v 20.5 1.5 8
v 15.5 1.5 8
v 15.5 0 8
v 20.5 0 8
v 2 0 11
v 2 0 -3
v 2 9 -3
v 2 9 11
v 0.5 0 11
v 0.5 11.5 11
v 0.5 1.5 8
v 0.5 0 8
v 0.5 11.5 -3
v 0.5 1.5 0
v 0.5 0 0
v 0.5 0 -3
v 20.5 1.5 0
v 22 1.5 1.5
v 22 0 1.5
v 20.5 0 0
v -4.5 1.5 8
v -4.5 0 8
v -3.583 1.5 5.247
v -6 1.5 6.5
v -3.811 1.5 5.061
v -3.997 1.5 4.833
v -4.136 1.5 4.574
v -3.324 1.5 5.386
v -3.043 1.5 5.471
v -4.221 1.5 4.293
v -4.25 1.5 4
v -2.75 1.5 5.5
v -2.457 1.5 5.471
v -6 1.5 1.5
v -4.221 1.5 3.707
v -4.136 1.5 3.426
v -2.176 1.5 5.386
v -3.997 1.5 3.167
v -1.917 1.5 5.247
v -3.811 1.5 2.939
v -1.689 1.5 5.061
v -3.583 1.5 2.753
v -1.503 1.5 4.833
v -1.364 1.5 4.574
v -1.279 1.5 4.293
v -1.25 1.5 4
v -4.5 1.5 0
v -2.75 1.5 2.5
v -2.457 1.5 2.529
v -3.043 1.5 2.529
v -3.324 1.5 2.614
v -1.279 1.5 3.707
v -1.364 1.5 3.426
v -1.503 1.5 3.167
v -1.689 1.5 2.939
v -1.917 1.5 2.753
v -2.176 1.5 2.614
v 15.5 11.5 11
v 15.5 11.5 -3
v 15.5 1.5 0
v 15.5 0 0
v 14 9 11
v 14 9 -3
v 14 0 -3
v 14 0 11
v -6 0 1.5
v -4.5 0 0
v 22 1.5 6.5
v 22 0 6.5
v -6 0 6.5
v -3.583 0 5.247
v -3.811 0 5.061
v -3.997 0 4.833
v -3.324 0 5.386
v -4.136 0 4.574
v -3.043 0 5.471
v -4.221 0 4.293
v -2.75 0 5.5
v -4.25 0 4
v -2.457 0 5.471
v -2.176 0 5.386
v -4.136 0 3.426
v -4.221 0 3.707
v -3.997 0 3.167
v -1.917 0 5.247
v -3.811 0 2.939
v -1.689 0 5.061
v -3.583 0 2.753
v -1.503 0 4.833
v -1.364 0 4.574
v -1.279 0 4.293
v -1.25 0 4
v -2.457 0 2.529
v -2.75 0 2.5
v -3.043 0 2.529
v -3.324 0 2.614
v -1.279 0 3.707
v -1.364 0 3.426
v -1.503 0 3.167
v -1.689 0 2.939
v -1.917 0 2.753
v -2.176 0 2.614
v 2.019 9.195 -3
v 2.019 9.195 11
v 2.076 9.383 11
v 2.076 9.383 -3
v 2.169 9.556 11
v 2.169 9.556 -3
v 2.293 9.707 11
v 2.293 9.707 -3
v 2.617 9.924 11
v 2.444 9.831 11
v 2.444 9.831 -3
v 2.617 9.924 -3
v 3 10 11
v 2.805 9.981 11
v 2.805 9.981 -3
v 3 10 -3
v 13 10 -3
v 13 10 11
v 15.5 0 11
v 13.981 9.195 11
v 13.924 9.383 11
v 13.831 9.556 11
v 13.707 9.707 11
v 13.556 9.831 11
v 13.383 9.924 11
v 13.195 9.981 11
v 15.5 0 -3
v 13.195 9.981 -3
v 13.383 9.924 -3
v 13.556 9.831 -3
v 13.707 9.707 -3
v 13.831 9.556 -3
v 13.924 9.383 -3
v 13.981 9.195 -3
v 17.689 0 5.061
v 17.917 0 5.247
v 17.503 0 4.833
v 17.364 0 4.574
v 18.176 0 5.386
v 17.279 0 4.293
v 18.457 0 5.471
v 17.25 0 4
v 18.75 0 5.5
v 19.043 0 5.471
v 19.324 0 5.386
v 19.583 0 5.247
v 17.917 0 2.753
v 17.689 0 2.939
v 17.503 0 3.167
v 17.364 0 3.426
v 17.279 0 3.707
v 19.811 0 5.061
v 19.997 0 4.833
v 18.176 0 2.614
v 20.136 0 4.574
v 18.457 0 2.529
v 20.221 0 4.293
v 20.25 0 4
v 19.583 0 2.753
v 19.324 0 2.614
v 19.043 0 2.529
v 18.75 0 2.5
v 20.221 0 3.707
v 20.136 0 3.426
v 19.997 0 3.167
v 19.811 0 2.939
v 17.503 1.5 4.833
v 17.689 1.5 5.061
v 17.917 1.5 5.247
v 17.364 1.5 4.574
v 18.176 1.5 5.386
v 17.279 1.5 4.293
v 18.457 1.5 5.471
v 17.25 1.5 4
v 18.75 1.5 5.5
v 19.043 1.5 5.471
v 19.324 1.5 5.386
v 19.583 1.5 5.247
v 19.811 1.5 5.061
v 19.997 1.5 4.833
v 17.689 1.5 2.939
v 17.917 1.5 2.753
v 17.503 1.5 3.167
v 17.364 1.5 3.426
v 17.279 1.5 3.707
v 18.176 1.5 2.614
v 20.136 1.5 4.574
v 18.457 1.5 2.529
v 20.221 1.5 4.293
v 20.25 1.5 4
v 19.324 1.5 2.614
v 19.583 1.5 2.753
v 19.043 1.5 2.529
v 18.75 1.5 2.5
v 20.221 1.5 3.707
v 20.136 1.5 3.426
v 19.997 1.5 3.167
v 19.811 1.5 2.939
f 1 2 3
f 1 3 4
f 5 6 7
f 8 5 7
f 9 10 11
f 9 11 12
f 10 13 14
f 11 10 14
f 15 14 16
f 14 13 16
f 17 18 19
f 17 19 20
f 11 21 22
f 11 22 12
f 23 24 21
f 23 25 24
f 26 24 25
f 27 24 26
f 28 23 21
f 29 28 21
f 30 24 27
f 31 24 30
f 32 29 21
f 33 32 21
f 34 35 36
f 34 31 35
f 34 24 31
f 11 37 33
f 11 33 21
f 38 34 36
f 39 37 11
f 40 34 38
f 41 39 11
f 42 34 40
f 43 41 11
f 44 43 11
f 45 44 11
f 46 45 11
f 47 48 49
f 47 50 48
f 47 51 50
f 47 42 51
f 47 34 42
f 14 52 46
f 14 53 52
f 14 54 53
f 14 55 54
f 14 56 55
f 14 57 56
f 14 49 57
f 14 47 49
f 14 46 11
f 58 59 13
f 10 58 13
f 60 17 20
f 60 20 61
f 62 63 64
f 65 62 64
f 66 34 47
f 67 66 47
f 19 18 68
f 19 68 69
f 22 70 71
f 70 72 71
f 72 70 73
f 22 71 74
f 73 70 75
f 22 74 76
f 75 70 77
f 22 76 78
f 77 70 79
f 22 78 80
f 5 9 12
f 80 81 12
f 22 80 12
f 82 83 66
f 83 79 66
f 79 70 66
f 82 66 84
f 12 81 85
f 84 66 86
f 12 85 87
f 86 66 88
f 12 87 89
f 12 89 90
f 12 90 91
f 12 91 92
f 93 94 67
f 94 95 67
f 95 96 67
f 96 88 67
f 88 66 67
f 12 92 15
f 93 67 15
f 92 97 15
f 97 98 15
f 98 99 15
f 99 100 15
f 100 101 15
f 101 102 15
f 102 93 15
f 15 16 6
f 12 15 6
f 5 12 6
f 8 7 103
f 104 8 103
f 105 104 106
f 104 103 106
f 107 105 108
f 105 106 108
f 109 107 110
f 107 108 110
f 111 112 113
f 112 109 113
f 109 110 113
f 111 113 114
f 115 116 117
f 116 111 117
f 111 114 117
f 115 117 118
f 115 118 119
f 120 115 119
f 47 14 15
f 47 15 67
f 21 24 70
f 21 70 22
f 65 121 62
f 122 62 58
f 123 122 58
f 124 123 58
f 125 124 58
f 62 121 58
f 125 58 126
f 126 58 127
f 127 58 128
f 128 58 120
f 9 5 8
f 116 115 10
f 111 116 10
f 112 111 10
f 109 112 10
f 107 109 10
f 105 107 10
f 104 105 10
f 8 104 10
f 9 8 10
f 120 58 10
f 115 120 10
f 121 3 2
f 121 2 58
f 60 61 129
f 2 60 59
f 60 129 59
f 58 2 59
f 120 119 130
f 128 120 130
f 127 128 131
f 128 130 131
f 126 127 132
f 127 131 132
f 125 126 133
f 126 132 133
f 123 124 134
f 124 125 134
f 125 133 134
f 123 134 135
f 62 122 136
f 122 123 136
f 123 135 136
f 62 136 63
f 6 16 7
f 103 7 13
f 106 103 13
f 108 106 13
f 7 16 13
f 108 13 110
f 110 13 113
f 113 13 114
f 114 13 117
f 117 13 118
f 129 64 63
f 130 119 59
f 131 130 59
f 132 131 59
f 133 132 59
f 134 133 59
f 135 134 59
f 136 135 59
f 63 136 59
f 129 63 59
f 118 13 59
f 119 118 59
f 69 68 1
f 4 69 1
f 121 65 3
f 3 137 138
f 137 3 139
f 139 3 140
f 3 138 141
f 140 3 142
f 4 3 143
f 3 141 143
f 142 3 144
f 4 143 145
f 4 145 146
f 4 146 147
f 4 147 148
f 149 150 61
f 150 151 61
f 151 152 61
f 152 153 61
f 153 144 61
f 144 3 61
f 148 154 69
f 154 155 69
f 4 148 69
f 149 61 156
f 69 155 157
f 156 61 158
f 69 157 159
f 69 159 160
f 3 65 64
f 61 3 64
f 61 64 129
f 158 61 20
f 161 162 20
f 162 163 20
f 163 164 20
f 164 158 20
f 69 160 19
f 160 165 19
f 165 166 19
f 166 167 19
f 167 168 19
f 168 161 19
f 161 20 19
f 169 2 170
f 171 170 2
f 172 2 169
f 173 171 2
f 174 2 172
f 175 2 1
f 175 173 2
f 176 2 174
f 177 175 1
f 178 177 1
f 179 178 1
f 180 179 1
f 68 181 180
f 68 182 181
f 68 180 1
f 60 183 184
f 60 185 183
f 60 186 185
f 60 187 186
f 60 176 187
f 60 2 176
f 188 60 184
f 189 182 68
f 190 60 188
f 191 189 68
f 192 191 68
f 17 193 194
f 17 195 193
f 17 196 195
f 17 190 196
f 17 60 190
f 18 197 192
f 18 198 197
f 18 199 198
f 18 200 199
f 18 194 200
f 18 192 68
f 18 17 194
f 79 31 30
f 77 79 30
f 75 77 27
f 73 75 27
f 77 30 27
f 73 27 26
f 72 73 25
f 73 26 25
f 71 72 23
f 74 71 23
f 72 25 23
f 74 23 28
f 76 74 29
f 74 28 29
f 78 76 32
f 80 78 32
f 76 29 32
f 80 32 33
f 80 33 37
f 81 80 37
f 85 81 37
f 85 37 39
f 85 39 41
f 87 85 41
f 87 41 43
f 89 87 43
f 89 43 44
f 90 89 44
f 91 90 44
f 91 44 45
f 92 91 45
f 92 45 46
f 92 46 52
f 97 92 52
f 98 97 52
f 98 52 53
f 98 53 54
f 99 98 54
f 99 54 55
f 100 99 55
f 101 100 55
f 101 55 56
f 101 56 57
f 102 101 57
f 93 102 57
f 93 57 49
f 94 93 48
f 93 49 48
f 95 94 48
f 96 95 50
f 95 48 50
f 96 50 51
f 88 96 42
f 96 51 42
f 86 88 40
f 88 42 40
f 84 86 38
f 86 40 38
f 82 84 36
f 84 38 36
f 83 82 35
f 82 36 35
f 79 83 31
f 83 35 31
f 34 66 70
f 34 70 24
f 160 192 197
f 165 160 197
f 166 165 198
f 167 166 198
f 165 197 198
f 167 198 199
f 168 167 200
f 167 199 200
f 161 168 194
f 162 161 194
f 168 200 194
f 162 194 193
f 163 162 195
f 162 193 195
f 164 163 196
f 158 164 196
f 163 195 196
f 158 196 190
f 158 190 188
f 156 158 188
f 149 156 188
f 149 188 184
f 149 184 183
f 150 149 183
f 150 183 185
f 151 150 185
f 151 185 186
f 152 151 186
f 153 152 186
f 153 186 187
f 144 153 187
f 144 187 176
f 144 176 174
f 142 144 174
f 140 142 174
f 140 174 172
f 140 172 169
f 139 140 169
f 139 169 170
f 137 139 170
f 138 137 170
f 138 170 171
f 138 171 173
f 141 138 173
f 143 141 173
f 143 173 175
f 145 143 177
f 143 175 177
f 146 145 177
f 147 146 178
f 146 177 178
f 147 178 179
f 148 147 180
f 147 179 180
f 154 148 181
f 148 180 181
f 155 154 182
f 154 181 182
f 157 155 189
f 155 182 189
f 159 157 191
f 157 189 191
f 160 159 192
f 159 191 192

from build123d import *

# Parameters (mm, degrees)
BOSS_EXTRUDE1_DEPTH = 11
SKETCH3_W           = 6.5
SKETCH3_H           = 1.5
CUT_EXTRUDE5_DEPTH  = 3
SKETCH6_R           = 1.5
CUT_EXTRUDE7_DEPTH  = 27.551836095
EXTRUDE_START       = 3
EXTRUDE_1_DEPTH     = 3


with BuildPart() as part:
    # Sketch1 → Boss-Extrude1 (new body)
    with BuildSketch(Plane.XY):
        with BuildLine():
            Line((0.5, 1.5), (0.5, 11.5))
            Line((0.5, 11.5), (15.5, 11.5))
            Line((15.5, 11.5), (15.5, 1.5))
            Line((15.5, 1.5), (22, 1.5))
            Line((22, 1.5), (22, 0))
            Line((22, 0), (14, 0))
            Line((14, 0), (14, 9))
            ThreePointArc((14, 9), (13.707106781, 9.707106781), (13, 10))
            Line((13, 10), (3, 10))
            ThreePointArc((3, 10), (2.292893219, 9.707106781), (2, 9))
            Line((2, 9), (2, 0))
            Line((2, 0), (-6, 0))
            Line((-6, 0), (-6, 1.5))
            Line((-6, 1.5), (0.5, 1.5))
        make_face()
    extrude(amount=BOSS_EXTRUDE1_DEPTH)

    # Sketch3 → Cut-Extrude5 (cut)
    with BuildSketch(Plane.XY.offset(11)):
        with Locations((-2.75, 0.75)):
            Rectangle(SKETCH3_W, SKETCH3_H)
        with Locations((18.75, 0.75)):
            Rectangle(SKETCH3_W, SKETCH3_H)
    extrude(amount=-CUT_EXTRUDE5_DEPTH, mode=Mode.SUBTRACT)

    # Sketch6 → Cut-Extrude7 (cut, through all)
    with BuildSketch(Plane(origin=(0, 1.5, 0), x_dir=(1, 0, 0), z_dir=(0, 1, 0))):
        with Locations(Location((-2.75, -4, 0), (0, 0, 180))):
            Circle(SKETCH6_R)
        with Locations((18.75, -4)):
            Circle(SKETCH6_R)
        Polygon((-6, -1.5), (-4.5, 0), (-6, 0), align=None)
        Polygon((20.5, 0), (22, 0), (22, -1.5), align=None)
        Polygon((22, -6.5), (20.5, -8), (22, -8), align=None)
        Polygon((-4.5, -8), (-6, -8), (-6, -6.5), align=None)
    extrude(amount=-CUT_EXTRUDE7_DEPTH, mode=Mode.SUBTRACT)

    # 草图1 → 凸台-拉伸1 (add)
    with BuildSketch(Plane(origin=(0, 0, 0), x_dir=(-1, 0, 0), z_dir=(0, 0, -1)).offset(EXTRUDE_START)):
        with BuildLine():
            Line((-0.5, 1.5), (-0.5, 0))
            Line((-0.5, 0), (-2, 0))
            Line((-2, 0), (-2, 9))
            ThreePointArc((-2, 9), (-2.292893219, 9.707106781), (-3, 10))
            Line((-3, 10), (-13, 10))
            ThreePointArc((-13, 10), (-13.707106781, 9.707106781), (-14, 9))
            Line((-14, 9), (-14, 0))
            Line((-14, 0), (-15.5, 0))
            Line((-15.5, 0), (-15.5, 1.5))
            Line((-15.5, 1.5), (-15.5, 11.5))
            Line((-15.5, 11.5), (-0.5, 11.5))
            Line((-0.5, 11.5), (-0.5, 1.5))
        make_face()
    extrude(amount=-EXTRUDE_1_DEPTH)


solid = part.part
